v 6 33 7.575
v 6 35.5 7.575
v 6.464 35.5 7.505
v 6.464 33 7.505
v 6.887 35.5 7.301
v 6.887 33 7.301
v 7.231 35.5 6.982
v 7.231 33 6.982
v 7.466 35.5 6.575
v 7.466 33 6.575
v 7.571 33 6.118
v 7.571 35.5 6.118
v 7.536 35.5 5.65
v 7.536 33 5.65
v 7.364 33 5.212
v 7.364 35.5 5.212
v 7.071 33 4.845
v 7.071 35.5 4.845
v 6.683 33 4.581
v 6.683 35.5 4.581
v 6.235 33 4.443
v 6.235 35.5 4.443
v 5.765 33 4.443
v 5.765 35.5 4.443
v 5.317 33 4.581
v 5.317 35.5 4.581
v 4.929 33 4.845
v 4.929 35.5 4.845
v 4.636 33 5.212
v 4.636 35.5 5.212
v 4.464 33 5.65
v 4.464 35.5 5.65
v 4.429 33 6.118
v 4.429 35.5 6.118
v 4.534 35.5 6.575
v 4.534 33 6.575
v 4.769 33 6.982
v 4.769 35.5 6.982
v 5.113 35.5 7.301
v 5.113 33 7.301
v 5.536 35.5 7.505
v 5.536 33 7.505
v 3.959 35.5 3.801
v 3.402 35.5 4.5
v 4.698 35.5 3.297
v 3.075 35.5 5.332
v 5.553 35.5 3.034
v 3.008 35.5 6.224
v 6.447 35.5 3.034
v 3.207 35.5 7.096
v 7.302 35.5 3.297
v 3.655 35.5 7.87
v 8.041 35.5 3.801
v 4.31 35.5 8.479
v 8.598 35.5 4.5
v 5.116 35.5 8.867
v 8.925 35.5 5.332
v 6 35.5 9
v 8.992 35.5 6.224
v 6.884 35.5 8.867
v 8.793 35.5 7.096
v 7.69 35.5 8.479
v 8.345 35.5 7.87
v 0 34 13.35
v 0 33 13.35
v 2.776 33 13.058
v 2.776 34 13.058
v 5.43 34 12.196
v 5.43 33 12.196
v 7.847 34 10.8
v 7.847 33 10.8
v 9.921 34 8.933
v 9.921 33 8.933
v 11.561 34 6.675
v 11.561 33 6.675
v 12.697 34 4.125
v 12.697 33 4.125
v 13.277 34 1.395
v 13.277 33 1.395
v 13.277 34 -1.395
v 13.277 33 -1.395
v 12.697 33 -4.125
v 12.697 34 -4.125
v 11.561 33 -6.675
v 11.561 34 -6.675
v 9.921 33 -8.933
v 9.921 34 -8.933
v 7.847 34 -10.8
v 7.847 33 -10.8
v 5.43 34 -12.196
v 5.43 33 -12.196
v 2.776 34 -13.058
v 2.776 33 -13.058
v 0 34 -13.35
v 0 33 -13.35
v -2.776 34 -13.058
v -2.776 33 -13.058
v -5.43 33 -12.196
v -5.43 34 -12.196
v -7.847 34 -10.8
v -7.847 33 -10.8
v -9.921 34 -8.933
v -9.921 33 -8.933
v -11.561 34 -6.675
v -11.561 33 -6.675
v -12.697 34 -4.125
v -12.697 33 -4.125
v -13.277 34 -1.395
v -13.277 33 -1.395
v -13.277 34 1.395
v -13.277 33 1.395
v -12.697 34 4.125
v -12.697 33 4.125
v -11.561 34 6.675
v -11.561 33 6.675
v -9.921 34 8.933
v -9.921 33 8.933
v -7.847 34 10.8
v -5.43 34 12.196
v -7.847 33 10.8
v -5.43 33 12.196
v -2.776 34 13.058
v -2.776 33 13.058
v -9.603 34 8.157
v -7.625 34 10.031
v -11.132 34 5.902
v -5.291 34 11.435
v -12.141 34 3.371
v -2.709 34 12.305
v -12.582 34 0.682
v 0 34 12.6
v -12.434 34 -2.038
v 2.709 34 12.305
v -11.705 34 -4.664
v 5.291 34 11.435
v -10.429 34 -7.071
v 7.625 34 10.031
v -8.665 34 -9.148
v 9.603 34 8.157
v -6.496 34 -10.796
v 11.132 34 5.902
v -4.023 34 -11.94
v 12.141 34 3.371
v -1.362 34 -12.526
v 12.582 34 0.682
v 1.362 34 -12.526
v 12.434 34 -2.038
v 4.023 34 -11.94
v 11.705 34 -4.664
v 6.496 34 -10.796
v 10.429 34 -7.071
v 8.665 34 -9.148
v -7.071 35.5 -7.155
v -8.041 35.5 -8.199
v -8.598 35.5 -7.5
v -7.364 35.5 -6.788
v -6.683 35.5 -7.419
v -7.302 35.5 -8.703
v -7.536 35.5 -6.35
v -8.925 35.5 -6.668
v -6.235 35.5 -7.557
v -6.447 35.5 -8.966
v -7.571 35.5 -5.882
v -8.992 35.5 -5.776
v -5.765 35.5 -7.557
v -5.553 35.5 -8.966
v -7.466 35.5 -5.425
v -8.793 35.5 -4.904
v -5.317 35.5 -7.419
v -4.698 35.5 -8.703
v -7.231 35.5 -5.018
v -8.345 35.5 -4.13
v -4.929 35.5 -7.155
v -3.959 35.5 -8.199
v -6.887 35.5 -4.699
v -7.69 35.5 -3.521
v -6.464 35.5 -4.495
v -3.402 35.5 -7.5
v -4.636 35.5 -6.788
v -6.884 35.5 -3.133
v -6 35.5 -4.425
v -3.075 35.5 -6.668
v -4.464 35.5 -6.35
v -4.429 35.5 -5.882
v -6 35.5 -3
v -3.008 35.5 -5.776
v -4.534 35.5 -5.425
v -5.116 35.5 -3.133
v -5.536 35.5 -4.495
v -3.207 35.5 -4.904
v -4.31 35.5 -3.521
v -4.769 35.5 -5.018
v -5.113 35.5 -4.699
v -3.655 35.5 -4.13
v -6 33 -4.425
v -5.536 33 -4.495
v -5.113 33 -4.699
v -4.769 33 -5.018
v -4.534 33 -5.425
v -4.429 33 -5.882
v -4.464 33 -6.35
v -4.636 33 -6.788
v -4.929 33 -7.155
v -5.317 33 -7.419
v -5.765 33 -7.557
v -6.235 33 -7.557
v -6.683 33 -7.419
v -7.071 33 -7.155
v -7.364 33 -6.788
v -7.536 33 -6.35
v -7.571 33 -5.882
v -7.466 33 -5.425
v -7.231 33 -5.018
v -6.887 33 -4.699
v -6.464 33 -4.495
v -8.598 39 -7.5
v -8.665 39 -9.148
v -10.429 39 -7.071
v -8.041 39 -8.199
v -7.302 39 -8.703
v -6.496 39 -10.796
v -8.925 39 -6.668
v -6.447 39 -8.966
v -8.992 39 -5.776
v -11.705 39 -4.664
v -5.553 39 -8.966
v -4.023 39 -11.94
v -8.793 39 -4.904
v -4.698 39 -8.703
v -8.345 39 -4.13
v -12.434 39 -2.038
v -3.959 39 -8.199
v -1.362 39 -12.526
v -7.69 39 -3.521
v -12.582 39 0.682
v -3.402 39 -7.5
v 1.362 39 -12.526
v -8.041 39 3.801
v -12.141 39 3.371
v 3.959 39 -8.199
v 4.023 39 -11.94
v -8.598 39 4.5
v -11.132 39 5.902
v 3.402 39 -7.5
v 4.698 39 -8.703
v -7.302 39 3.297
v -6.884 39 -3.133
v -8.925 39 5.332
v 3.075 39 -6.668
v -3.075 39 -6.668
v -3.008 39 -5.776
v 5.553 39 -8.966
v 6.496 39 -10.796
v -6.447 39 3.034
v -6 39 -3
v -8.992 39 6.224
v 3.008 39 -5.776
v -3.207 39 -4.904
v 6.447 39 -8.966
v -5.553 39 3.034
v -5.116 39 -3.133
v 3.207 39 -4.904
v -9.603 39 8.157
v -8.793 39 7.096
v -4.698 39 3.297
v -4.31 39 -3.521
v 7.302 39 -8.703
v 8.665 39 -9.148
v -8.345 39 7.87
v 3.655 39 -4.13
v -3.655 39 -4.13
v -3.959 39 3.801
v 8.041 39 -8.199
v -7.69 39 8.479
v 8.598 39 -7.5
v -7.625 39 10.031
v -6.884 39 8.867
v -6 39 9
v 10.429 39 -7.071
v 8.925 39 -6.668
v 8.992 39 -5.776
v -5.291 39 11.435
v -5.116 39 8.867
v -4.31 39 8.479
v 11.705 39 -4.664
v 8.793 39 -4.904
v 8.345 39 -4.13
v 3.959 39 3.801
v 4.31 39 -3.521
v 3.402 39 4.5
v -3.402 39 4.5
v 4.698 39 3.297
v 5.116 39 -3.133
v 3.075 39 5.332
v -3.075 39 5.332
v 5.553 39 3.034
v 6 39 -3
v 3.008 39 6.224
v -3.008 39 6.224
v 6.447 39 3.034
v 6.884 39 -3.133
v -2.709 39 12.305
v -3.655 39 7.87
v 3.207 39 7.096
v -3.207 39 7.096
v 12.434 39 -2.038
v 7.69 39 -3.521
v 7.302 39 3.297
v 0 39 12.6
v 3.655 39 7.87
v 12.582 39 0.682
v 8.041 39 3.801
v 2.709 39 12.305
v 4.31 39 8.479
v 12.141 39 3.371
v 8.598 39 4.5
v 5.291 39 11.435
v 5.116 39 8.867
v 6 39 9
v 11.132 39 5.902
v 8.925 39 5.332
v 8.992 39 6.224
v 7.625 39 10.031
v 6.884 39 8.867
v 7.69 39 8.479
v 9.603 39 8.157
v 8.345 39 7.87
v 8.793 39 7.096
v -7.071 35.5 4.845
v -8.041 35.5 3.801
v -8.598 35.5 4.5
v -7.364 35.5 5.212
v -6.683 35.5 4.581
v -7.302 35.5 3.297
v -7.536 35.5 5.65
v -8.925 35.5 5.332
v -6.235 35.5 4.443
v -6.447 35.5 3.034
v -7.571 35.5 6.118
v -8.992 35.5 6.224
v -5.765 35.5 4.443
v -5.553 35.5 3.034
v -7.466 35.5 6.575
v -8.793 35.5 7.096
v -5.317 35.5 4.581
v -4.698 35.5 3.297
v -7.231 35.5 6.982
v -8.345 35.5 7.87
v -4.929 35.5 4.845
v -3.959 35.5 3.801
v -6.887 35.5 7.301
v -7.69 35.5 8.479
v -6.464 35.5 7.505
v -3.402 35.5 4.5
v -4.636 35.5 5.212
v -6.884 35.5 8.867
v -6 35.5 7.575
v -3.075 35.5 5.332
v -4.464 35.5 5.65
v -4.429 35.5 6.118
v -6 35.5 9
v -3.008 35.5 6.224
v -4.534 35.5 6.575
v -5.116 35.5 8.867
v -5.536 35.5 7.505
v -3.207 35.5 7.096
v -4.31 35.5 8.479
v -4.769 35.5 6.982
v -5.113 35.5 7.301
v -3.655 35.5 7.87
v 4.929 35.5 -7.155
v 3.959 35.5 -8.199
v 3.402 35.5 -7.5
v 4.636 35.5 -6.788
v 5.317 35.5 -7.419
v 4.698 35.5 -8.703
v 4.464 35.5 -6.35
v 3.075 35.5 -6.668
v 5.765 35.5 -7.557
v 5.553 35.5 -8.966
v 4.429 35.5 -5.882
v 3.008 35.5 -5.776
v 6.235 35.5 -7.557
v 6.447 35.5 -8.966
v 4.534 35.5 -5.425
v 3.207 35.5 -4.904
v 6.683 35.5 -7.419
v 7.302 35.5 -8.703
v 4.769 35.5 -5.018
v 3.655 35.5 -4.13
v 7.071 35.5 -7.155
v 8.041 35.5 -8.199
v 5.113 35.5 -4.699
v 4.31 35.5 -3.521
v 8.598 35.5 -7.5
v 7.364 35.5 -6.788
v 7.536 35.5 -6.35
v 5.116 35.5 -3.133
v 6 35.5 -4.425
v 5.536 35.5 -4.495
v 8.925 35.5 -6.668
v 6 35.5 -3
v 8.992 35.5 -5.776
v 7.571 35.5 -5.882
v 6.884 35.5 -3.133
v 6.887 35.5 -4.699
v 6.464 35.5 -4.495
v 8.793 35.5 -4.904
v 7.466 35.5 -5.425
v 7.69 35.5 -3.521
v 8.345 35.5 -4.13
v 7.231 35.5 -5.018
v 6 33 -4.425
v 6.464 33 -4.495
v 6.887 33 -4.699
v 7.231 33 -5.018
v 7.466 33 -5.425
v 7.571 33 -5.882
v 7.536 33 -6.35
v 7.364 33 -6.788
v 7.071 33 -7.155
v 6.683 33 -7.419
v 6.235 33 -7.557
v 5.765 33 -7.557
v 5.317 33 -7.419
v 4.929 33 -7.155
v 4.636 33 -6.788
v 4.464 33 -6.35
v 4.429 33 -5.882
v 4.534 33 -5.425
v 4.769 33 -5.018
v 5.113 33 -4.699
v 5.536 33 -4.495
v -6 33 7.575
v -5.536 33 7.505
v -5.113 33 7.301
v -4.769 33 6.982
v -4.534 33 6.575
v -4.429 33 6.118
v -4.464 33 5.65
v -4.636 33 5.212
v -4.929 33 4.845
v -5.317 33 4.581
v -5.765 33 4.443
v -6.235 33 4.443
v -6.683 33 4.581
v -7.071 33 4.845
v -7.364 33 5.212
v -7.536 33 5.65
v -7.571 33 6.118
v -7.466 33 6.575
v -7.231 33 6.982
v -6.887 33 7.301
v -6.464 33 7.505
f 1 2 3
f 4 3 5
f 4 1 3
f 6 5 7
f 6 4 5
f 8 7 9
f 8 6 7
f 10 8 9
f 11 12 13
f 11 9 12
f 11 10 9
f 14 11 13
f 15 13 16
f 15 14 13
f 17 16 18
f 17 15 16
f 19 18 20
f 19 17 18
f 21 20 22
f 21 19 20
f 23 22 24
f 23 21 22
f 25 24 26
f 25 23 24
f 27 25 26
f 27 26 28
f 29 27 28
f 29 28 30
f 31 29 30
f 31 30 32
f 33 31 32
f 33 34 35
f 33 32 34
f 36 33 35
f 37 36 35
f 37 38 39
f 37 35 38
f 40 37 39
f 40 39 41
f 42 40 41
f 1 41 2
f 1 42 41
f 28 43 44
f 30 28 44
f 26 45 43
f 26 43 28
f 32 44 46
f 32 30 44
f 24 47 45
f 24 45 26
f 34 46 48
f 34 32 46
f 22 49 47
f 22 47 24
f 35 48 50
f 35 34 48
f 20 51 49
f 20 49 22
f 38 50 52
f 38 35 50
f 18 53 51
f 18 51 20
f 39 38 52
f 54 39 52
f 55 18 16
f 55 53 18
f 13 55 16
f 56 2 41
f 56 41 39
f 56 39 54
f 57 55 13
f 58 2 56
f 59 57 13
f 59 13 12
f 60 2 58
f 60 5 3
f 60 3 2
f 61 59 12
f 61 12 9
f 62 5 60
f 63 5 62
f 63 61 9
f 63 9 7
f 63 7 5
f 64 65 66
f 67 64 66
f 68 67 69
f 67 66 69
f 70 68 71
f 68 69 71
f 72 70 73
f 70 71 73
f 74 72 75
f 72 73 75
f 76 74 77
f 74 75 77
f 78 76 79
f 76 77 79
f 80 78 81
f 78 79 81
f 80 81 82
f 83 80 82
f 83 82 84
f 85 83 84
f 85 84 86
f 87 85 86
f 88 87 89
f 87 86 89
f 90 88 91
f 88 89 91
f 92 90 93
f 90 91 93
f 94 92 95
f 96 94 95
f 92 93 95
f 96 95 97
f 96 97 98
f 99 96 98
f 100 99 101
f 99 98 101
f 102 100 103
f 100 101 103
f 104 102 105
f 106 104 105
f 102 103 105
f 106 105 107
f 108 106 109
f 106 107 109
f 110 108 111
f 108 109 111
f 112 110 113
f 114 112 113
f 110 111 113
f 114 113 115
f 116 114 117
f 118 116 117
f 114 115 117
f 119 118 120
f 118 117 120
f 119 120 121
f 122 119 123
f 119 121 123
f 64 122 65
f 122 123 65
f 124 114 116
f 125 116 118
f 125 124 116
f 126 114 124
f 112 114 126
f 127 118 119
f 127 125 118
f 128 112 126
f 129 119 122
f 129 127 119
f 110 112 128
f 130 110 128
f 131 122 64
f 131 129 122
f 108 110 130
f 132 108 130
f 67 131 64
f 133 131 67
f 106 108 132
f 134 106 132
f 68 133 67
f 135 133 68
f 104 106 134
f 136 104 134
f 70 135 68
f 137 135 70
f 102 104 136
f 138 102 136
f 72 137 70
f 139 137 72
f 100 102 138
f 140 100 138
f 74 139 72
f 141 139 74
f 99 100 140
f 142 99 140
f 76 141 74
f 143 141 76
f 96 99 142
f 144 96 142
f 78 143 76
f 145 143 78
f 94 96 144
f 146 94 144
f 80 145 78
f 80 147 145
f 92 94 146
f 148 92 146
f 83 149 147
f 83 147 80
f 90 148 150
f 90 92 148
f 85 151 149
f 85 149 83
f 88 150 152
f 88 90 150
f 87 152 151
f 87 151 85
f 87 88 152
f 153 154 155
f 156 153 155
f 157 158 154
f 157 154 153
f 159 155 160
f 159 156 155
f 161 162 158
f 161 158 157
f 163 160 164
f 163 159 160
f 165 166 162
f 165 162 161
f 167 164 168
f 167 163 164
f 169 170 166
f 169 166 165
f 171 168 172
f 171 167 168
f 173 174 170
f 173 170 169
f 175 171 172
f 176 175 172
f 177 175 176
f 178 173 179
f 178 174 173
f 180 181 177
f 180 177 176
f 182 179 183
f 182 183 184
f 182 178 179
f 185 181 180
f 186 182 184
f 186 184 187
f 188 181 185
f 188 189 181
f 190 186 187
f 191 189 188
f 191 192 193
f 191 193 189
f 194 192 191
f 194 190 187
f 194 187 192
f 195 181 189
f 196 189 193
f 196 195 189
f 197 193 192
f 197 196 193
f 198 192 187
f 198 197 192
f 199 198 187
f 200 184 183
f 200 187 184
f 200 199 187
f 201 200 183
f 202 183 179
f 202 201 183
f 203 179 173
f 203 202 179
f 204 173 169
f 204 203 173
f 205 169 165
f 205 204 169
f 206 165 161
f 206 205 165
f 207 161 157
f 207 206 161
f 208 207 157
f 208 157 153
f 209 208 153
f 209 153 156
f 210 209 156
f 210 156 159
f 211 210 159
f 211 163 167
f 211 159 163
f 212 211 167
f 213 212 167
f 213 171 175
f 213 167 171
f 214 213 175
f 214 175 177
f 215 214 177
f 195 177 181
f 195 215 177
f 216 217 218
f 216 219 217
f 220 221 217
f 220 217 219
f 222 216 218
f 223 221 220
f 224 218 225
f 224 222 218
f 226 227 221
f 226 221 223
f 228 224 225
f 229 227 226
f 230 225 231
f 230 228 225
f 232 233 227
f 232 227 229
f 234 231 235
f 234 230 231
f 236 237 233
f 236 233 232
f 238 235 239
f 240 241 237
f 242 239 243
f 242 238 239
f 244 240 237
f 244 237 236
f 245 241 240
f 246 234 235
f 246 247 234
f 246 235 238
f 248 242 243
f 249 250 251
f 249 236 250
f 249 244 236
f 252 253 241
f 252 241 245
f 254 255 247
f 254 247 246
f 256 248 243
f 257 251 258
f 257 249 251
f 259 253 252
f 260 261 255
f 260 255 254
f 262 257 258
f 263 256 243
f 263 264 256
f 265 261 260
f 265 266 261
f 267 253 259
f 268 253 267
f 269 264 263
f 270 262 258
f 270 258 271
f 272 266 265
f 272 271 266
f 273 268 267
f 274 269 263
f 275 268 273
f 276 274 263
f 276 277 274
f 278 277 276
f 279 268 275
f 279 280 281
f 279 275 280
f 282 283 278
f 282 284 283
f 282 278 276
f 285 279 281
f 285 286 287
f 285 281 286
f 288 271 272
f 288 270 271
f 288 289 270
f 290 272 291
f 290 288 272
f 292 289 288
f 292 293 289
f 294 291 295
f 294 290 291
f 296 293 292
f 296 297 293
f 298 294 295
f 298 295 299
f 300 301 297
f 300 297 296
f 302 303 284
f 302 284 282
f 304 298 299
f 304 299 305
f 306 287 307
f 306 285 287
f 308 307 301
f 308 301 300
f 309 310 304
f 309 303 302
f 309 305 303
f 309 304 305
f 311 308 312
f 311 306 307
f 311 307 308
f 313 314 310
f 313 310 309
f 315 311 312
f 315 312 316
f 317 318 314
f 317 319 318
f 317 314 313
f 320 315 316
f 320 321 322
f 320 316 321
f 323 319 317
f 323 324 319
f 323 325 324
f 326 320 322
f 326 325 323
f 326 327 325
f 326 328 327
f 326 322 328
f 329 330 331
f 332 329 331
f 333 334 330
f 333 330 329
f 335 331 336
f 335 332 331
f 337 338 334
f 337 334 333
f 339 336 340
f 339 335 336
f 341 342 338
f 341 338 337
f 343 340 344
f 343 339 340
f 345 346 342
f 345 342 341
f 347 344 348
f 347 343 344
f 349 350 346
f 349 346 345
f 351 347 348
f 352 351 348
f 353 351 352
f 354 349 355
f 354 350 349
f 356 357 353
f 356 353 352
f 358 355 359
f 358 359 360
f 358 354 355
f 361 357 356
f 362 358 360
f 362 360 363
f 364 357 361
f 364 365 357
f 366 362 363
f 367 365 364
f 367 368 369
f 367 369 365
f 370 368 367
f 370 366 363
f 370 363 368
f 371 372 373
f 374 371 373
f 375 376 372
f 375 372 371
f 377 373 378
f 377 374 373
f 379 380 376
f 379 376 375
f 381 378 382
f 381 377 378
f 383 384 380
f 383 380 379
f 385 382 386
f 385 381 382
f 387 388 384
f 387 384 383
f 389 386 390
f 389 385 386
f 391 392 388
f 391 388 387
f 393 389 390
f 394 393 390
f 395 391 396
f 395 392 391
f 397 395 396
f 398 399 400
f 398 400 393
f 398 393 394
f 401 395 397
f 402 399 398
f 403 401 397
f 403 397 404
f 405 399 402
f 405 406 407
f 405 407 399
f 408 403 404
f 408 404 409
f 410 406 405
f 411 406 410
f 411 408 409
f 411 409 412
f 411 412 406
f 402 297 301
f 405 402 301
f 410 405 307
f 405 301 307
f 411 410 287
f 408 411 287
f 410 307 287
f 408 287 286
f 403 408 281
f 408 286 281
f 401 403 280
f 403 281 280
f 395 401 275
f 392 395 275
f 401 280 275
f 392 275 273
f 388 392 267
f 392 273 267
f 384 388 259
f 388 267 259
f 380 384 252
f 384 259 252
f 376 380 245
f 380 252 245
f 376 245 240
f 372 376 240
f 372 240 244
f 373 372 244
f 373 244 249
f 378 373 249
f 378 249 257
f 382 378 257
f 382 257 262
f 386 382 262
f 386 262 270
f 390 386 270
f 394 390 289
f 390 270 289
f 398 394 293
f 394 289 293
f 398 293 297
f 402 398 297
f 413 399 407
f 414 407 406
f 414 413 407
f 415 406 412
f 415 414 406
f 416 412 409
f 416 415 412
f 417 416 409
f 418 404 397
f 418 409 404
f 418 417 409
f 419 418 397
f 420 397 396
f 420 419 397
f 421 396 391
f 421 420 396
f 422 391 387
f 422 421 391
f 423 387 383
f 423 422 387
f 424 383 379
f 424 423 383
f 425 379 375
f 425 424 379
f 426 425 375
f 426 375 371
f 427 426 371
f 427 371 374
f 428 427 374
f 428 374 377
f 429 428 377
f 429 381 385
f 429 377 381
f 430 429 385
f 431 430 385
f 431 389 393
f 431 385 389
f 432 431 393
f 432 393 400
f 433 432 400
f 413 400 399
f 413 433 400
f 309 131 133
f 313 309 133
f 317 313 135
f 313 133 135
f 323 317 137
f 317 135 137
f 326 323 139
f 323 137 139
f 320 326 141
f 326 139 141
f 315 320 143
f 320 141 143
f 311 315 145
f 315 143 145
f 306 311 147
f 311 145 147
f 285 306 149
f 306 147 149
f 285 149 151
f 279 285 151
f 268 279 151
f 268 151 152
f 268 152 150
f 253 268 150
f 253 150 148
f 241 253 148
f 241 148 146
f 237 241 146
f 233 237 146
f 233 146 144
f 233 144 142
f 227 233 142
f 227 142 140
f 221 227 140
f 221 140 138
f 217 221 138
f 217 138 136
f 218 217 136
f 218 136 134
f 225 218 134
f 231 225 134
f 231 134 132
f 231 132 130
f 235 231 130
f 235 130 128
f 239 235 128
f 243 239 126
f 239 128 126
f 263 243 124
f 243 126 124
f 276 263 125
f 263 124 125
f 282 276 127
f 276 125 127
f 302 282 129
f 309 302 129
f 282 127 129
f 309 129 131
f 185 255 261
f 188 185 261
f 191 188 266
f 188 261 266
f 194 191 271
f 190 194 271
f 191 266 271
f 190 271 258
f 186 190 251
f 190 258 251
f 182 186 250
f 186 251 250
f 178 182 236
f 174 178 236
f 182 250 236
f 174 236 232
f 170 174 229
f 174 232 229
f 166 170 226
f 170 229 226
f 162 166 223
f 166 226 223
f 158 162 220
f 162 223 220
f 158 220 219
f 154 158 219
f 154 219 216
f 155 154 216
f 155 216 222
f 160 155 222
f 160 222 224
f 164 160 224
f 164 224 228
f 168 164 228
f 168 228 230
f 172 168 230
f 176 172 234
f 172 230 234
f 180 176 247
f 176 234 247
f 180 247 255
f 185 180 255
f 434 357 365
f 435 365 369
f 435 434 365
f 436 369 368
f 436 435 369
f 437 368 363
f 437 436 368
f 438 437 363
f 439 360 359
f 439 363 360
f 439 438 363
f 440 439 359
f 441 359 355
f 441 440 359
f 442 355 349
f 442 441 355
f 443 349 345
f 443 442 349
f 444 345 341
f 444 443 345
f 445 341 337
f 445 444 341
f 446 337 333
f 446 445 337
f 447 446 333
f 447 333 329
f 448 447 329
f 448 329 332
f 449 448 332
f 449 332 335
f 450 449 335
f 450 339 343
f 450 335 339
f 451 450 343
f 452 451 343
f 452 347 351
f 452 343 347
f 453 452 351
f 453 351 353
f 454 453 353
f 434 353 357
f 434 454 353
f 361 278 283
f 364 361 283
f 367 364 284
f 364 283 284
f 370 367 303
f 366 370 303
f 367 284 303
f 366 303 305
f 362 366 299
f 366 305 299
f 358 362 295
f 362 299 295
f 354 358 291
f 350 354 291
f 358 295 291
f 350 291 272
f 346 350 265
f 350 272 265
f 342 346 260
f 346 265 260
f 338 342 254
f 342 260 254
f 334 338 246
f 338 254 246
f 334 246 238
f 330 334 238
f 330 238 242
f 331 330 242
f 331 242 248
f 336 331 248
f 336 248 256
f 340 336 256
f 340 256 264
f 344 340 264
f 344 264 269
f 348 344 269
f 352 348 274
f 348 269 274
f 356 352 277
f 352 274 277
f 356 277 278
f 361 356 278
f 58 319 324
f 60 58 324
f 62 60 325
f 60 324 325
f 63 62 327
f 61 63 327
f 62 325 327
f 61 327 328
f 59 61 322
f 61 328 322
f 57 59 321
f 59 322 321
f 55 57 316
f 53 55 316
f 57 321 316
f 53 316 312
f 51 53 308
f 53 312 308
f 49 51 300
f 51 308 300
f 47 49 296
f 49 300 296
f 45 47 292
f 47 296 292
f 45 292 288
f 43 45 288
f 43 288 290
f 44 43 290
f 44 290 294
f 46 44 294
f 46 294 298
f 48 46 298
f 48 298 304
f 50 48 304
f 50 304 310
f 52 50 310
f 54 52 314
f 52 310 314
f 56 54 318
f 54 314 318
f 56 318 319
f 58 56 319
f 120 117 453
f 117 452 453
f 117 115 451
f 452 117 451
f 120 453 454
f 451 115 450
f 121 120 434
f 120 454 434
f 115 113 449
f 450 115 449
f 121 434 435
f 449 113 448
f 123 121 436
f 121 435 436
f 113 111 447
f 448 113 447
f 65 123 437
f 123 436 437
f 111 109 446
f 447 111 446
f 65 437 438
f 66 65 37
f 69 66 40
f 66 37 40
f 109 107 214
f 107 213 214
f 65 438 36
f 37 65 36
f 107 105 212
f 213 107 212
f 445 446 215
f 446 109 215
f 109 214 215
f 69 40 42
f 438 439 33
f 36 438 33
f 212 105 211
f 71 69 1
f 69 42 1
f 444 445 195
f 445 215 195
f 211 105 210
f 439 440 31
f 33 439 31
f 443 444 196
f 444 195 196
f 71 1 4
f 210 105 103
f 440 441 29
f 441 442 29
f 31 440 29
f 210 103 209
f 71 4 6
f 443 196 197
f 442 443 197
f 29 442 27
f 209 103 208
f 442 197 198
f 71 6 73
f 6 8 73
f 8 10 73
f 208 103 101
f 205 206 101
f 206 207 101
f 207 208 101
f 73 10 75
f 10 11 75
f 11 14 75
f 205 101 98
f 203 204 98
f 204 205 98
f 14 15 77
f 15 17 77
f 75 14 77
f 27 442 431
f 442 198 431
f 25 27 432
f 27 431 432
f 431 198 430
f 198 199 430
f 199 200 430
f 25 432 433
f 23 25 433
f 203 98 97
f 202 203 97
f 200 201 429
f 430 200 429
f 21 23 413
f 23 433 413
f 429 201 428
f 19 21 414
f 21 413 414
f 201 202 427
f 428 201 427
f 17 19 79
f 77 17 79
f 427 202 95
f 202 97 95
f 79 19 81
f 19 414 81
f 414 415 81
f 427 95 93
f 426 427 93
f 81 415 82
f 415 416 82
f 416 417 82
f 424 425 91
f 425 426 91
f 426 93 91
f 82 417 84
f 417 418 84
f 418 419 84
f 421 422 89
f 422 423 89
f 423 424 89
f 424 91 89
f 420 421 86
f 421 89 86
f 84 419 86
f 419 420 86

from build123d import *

# Parameters (mm, degrees)
SKETCH1_R           = 13.35
SKETCH1_R_2         = 12.6
SKETCH1_R_3         = 1.575
BOSS_EXTRUDE1_DEPTH = 1
SKETCH1_3_R         = 12.6
SKETCH1_3_R_2       = 1.575
BOSS_EXTRUDE2_DEPTH = 6
SKETCH2_R           = 3
CUT_EXTRUDE1_DEPTH  = 3.5


with BuildPart() as part:
    # Sketch1 → Boss-Extrude1 (new body)
    # profile 1 of 2: a face of its own
    with BuildSketch(Plane(origin=(0, 33, 0), x_dir=(1, 0, 0), z_dir=(0, 1, 0))):
        with Locations(Location((0, 0, 0), (0, 0, 270))):
            Circle(SKETCH1_R)
        Circle(SKETCH1_R_2, mode=Mode.SUBTRACT)
    # profile 2 of 2: a face of its own
    with BuildSketch(Plane(origin=(0, 33, 0), x_dir=(1, 0, 0), z_dir=(0, 1, 0))):
        Circle(SKETCH1_R_2)
        with Locations(Location((6, -6, 0), (0, 0, 270))):
            Circle(SKETCH1_R_3, mode=Mode.SUBTRACT)
        with Locations(Location((-6, 6, 0), (0, 0, 270))):
            Circle(SKETCH1_R_3, mode=Mode.SUBTRACT)
        with Locations(Location((6, 6, 0), (0, 0, 270))):
            Circle(SKETCH1_R_3, mode=Mode.SUBTRACT)
        with Locations(Location((-6, -6, 0), (0, 0, 270))):
            Circle(SKETCH1_R_3, mode=Mode.SUBTRACT)
    extrude(amount=BOSS_EXTRUDE1_DEPTH)

    # Sketch1<3> → Boss-Extrude2 (add)
    with BuildSketch(Plane(origin=(0, 33, 0), x_dir=(1, 0, 0), z_dir=(0, 1, 0))):
        with Locations(Location((0, 0, 0), (0, 0, 270))):
            Circle(SKETCH1_3_R)
        with Locations(Location((6, -6, 0), (0, 0, 270))):
            Circle(SKETCH1_3_R_2, mode=Mode.SUBTRACT)
        with Locations(Location((-6, 6, 0), (0, 0, 270))):
            Circle(SKETCH1_3_R_2, mode=Mode.SUBTRACT)
        with Locations(Location((6, 6, 0), (0, 0, 270))):
            Circle(SKETCH1_3_R_2, mode=Mode.SUBTRACT)
        with Locations(Location((-6, -6, 0), (0, 0, 270))):
            Circle(SKETCH1_3_R_2, mode=Mode.SUBTRACT)
    extrude(amount=BOSS_EXTRUDE2_DEPTH)

    # Sketch2 → Cut-Extrude1 (cut)
    with BuildSketch(Plane(origin=(0, 39, 0), x_dir=(1, 0, 0), z_dir=(0, 1, 0))):
        with Locations(Location((-6, 6, 0), (0, 0, 270))):
            Circle(SKETCH2_R)
        with Locations(Location((6, 6, 0), (0, 0, 270))):
            Circle(SKETCH2_R)
        with Locations(Location((6, -6, 0), (0, 0, 270))):
            Circle(SKETCH2_R)
        with Locations(Location((-6, -6, 0), (0, 0, 270))):
            Circle(SKETCH2_R)
    extrude(amount=-CUT_EXTRUDE1_DEPTH, mode=Mode.SUBTRACT)


solid = part.part
